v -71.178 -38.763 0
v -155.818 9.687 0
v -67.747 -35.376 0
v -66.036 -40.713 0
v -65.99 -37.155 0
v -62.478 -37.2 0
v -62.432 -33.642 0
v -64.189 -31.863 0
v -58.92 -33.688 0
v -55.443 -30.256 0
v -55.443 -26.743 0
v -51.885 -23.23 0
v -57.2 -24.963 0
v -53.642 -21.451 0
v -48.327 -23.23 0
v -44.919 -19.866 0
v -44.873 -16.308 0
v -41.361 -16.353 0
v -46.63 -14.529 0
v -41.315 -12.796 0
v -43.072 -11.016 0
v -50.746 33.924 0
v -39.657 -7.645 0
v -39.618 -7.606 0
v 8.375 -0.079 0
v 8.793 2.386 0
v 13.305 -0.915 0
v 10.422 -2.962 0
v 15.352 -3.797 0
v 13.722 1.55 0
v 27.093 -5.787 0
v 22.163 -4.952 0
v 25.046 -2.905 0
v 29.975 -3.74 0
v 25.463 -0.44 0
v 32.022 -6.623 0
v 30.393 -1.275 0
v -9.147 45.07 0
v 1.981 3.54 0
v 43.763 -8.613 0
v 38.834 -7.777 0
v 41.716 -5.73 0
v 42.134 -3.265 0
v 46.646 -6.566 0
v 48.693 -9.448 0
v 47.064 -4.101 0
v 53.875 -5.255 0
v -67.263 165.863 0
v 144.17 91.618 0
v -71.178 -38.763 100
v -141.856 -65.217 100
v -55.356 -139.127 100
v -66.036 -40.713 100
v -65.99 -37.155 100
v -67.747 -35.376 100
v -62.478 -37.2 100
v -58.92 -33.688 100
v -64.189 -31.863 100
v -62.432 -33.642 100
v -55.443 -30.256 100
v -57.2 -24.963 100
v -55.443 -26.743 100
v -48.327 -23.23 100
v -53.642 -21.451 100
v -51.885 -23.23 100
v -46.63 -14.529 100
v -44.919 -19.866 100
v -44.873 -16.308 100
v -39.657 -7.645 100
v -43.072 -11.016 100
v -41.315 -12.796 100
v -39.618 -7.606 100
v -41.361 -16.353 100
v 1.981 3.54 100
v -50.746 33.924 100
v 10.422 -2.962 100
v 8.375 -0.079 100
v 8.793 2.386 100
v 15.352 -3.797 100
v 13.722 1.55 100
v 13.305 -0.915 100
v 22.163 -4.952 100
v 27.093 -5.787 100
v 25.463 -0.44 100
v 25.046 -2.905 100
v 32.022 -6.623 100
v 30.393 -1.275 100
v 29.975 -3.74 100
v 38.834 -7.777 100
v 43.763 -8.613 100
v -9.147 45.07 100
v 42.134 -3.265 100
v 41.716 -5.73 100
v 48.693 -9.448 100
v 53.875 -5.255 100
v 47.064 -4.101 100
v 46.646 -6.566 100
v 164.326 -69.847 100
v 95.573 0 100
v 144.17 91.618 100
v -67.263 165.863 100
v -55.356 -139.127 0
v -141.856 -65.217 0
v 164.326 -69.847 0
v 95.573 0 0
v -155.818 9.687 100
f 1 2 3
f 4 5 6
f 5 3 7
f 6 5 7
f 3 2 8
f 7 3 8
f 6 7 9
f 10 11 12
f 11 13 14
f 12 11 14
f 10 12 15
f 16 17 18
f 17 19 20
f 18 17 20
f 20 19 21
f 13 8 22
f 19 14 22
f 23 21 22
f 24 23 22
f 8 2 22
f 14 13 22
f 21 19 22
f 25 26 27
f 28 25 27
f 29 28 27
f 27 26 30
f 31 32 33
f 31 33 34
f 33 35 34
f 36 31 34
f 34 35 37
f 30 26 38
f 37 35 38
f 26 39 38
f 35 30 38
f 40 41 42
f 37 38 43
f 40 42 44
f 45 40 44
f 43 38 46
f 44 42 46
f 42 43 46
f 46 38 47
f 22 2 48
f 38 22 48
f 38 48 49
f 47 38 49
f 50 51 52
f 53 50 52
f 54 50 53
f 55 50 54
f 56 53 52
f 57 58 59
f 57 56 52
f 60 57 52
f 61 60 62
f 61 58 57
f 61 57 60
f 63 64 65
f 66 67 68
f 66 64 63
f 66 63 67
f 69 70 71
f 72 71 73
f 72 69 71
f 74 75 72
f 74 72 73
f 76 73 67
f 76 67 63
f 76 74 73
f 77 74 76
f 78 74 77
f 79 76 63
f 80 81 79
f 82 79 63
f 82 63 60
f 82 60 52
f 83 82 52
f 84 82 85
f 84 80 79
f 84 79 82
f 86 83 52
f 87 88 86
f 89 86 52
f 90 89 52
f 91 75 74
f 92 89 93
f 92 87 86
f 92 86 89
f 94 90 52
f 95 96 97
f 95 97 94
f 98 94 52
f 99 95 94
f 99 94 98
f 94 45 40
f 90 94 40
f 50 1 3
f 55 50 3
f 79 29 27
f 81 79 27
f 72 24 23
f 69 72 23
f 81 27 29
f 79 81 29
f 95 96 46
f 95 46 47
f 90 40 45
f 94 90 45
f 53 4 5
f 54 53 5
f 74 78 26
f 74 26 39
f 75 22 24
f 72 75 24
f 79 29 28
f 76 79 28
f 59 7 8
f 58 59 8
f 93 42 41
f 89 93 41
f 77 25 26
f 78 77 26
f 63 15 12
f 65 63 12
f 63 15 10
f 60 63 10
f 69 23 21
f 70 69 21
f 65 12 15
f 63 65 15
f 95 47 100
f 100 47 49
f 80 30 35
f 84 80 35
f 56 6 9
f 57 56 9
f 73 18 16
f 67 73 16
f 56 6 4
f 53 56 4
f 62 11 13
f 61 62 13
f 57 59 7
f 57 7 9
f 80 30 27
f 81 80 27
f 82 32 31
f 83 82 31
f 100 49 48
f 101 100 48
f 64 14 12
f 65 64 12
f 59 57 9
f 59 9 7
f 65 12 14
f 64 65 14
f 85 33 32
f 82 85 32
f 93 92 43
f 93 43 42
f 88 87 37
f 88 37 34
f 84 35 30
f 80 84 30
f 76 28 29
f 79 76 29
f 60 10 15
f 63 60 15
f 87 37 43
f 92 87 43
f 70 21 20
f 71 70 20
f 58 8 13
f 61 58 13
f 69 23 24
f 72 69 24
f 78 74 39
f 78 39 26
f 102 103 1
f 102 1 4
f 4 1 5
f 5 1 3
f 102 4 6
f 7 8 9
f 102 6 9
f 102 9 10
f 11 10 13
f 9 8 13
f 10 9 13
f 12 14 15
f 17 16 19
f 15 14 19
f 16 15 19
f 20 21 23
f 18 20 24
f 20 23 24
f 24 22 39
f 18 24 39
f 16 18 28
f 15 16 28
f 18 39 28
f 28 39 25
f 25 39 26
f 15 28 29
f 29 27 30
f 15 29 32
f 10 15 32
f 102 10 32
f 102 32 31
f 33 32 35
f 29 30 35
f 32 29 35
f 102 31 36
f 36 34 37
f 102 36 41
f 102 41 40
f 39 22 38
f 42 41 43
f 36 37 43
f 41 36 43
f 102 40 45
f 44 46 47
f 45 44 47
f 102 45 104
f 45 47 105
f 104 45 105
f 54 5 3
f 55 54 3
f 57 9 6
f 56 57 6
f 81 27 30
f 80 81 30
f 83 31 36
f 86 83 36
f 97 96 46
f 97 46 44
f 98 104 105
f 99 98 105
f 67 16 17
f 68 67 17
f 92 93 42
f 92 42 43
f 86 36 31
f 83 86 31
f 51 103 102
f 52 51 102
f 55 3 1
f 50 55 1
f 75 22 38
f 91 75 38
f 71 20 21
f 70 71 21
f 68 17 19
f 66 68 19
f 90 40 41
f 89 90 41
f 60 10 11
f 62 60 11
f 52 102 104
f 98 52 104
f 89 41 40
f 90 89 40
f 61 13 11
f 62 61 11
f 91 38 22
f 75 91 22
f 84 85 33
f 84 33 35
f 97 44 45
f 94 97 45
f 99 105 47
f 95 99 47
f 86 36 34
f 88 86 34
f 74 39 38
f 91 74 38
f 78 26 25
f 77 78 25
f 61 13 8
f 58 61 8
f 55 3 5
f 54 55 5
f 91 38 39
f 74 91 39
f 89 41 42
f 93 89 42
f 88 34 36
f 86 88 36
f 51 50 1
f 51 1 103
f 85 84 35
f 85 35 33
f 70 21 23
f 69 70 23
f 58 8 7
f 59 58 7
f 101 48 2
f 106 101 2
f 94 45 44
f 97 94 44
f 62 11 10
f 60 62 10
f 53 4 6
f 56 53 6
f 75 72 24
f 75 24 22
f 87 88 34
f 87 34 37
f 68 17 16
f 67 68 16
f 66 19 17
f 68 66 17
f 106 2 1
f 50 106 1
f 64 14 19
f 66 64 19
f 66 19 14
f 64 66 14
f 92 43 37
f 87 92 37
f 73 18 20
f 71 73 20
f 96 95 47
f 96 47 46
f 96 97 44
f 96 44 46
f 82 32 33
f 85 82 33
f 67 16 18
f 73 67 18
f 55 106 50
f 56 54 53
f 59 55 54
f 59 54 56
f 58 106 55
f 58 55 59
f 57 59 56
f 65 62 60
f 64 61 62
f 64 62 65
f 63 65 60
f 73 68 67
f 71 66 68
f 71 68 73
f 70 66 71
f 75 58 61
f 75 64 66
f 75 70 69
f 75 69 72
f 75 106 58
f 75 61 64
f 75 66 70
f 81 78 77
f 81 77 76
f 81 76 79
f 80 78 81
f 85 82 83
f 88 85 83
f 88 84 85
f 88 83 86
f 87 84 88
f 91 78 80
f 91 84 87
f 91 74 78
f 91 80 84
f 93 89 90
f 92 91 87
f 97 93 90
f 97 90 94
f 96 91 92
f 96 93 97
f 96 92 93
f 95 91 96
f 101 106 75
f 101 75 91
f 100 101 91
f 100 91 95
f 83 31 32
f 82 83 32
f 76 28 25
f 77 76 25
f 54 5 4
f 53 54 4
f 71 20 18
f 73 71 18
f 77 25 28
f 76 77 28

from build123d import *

# Parameters (mm, degrees)
F1_DEPTH = 100
F2_DEPTH = 100


with BuildPart() as f1:
    # F0 (on Top) → F1 (new body)
    with BuildSketch(Plane.XY):
        Polygon((47.063552, -4.100652), (53.87475, -5.25502), (54.52035, -3.4165), (55.49985, -0.94579), (57.70885, 4.3215), (58.83355, 7.1273), (59.89635, 10.0413), (60.84015, 13.0489), (61.60975, 16.1281), (62.15425, 19.2503), (62.42905, 22.3813), (62.39715, 25.483), (62.03065, 28.5147), (61.64635, 30.0767), (56.95075, 31.9738), (54.45145, 32.505), (54.47725, 32.6261), (53.28815, 33.6967), (53.62085, 35.2618), (55.14255, 35.7562), (55.32655, 35.5905), (57.88995, 35.0457), (60.28315, 34.0787), (60.23445, 34.2037), (58.80165, 36.7834), (57.02775, 39.1417), (54.93675, 41.2523), (52.56115, 43.0965), (49.94065, 44.6643), (47.12005, 45.9551), (44.14795, 46.9776), (41.07425, 47.75), (37.94825, 48.2994), (34.81675, 48.6605), (31.72235, 48.8748), (28.70165, 48.9886), (22.99125, 49.1129), (20.33575, 49.2231), (17.82175, 49.4276), (15.44465, 49.7675), (13.19215, 50.2766), (11.04515, 50.9802), (8.97875, 51.894), (6.96425, 53.0228), (4.97025, 54.3608), (2.96505, 55.8911), (0.91795, 57.5861), (-3.4089, 61.3147), (-5.72986, 63.2514), (-8.17284, 65.1627), (-10.74162, 66.9897), (-13.40326, 68.655), (-16.20161, 75.2043), (-14.03963, 79.8407), (-19.57281, 82.4209), (-20.20982, 83.7705), (-24.42685, 91.3774), (-29.06795, 98.0634), (-31.05355, 100.1334), (-37.50015, 98.4054), (-37.48715, 98.3574), (-43.86225, 96.6494), (-43.87525, 96.6974), (-50.32175, 94.9704), (-51.00685, 92.1854), (-51.68285, 84.0741), (-51.53145, 75.3779), (-51.40835, 73.8905), (-54.91005, 68.8895), (-50.40475, 65.7348), (-48.90245, 67.8802), (-42.34855, 43.4208), (-51.04195, 41.0914), (-53.64105, 50.7915), (-53.81195, 50.3678), (-54.85355, 47.5301), (-56.73645, 42.1377), (-57.66175, 39.6462), (-58.63325, 37.3183), (-59.69105, 35.1626), (-60.87125, 33.1777), (-62.20395, 31.3532), (-63.71145, 29.6703), (-65.40765, 28.1032), (-67.29635, 26.6203), (-69.37125, 25.1861), (-71.61595, 23.763), (-76.49915, 20.8001), (-79.05825, 19.1913), (-81.63085, 17.4585), (-84.16225, 15.58), (-86.59475, 13.5412), (-88.87045, 11.3354), (-90.93315, 8.9639), (-92.73045, 6.4358), (-94.21595, 3.7677), (-94.82315, 2.2781), (-92.13945, -2.01668), (-90.42975, -3.9155), (-90.52175, -3.99832), (-90.18905, -5.56336), (-91.37805, -6.63397), (-92.89975, -6.13954), (-92.95125, -5.89739), (-94.70485, -3.94984), (-96.07265, -1.7609), (-96.10675, -1.89056), (-96.46385, -4.81984), (-96.41485, -7.7704), (-95.96375, -10.70692), (-95.12595, -13.59526), (-93.92745, -16.40399), (-92.40425, -19.10613), (-90.60075, -21.6803), (-88.56805, -24.1119), (-86.36195, -26.3938), (-84.04085, -28.5265), (-81.66345, -30.5187), (-79.28645, -32.3863), (-74.73975, -35.8434), (-72.65615, -37.4933), (-71.17785, -38.7628), (-67.746659, -35.375531), (-65.990316, -37.154648), (-66.036159, -40.712882), (-62.477924, -37.200195), (-58.91969, -33.687508), (-62.432377, -33.642252), (-64.18872, -31.863135), (-57.199591, -24.963471), (-55.443247, -26.742588), (-55.443247, -30.255566), (-51.885013, -26.742879), (-48.326779, -23.230192), (-51.885308, -23.230192), (-53.641652, -21.451075), (-46.629601, -14.528783), (-44.873258, -16.3079), (-44.9191, -19.866134), (-41.360866, -16.353447), (-41.315319, -12.795504), (-43.071662, -11.016387), (-39.656596, -7.645036), (-39.61755, -7.60649), (-50.74555, 33.9239), (-9.14656, 45.0703), (1.98145, 3.5399), (8.792648, 2.385532), (8.374903, -0.079318), (10.422009, -2.961914), (15.35171, -3.797404), (13.304605, -0.914808), (13.72235, 1.550042), (25.463249, -0.439815), (25.045504, -2.904666), (22.162909, -4.951772), (27.09261, -5.787261), (32.022312, -6.622751), (29.975206, -3.740156), (30.392951, -1.275305), (42.13385, -3.265162), (41.716105, -5.730013), (38.83351, -7.777119), (43.763211, -8.612609), (48.692913, -9.448099), (46.645807, -6.565503), align=None)
        Polygon((-71.09905, -29.6513), (-71.20325, -29.5837), (-73.46545, -29.4651), (-78.15285, -28.7227), (-82.73695, -27.4944), (-84.95225, -26.644), (-83.80545, -23.6566), (-81.74675, -24.4468), (-77.48665, -25.5883), (-73.13045, -26.2783), (-70.92835, -26.3937), (-70.93155, -26.4557), (-69.58965, -27.3272), (-69.67345, -28.925), align=None, mode=Mode.SUBTRACT)
        Polygon((-70.74295, -22.8573), (-74.18435, -22.3123), (-77.43725, -21.0636), (-80.35935, -19.16594), (-82.82315, -16.70218), (-84.72085, -13.78001), (-85.96945, -10.52715), (-86.51455, -7.08579), (-86.33215, -3.60628), (-85.43035, -0.24072), (-83.84855, 2.8638), (-81.65585, 5.5716), (-78.94805, 7.7643), (-75.84355, 9.3462), (-72.47795, 10.248), (-68.99845, 10.4303), (-65.55705, 9.8853), (-62.30415, 8.6366), (-59.38205, 6.7389), (-56.91825, 4.2752), (-55.02055, 1.353), (-53.77195, -1.89987), (-53.22685, -5.34126), (-53.40925, -8.820756), (-54.31105, -12.1863), (-55.89285, -15.29082), (-58.08555, -17.99861), (-60.79335, -20.1914), (-63.89795, -21.7732), (-67.26345, -22.675), align=None, mode=Mode.SUBTRACT)
        Polygon((47.65305, 2.5126), (46.78155, 3.8544), (47.50795, 5.28), (49.10575, 5.3638), (49.97715, 4.0219), (49.25085, 2.5963), align=None, mode=Mode.SUBTRACT)
        Polygon((-68.80985, 14.0287), (-70.15175, 14.9001), (-70.06795, 16.4979), (-68.64235, 17.2243), (-67.30055, 16.3529), (-67.38425, 14.7551), align=None, mode=Mode.SUBTRACT)
        Polygon((-38.42705, 76.3648), (-41.06855, 86.2228), (-40.95165, 86.2541), (-40.99295, 86.4082), (-40.82145, 86.6005), (-40.83585, 86.6542), (-40.60045, 86.9603), (-40.34885, 87.0277), (-40.37745, 87.1348), (-40.04765, 87.5049), (-39.58545, 87.769), (-39.29825, 86.6972), (-36.45885, 87.458), (-36.74675, 88.5325), (-36.73955, 88.5344), (-36.57845, 88.5497), (-35.93765, 88.4719), (-35.69425, 88.2749), (-35.46745, 88.3356), (-35.06415, 88.1691), (-35.05765, 88.145), (-34.76845, 87.9109), (-34.69345, 87.931), (-32.05195, 78.073), align=None, mode=Mode.SUBTRACT)
        Polygon((35.59585, 5.6361), (32.15445, 6.1811), (28.90165, 7.4298), (25.97945, 9.3275), (23.51575, 11.7912), (21.61805, 14.7134), (20.36935, 17.9662), (19.82435, 21.4076), (20.00665, 24.8871), (20.90845, 28.2527), (22.49025, 31.3572), (24.68305, 34.065), (27.39085, 36.2577), (30.49535, 37.8396), (33.86085, 38.7414), (37.34045, 38.9237), (40.78175, 38.3787), (44.03465, 37.13), (46.95685, 35.2323), (49.42055, 32.7686), (51.31825, 29.8464), (52.56695, 26.5935), (53.11195, 23.1522), (52.92965, 19.6727), (52.02785, 16.3071), (50.44595, 13.2026), (48.25325, 10.4948), (45.54545, 8.3021), (42.44095, 6.7202), (39.07535, 5.8184), align=None, mode=Mode.SUBTRACT)
        Polygon((23.83045, 39.196), (22.95905, 40.5379), (23.68545, 41.9635), (23.80955, 41.97), (25.70935, 43.2038), (29.93795, 45.3583), (34.36855, 47.0591), (36.66065, 47.6732), (37.48885, 44.5823), (35.35875, 44.0115), (31.24125, 42.431), (27.31155, 40.4287), (25.46215, 39.2276), (25.42835, 39.2798), align=None, mode=Mode.SUBTRACT)
        Polygon((-40.95165, 86.2541), (-41.06855, 86.2228), (-38.42705, 76.3648), (-32.05195, 78.073), (-34.69345, 87.931), (-34.76845, 87.9109), (-35.05765, 88.145), (-35.06415, 88.1691), (-35.46745, 88.3356), (-35.69425, 88.2749), (-35.93765, 88.4719), (-36.57845, 88.5497), (-36.73955, 88.5344), (-36.74675, 88.5325), (-36.45885, 87.458), (-39.29825, 86.6972), (-39.58545, 87.769), (-40.04765, 87.5049), (-40.37745, 87.1348), (-40.34885, 87.0277), (-40.60045, 86.9603), (-40.83585, 86.6542), (-40.82145, 86.6005), (-40.99295, 86.4082), align=None)
        Polygon((28.90165, 7.4298), (32.15445, 6.1811), (35.59585, 5.6361), (39.07535, 5.8184), (42.44095, 6.7202), (45.54545, 8.3021), (48.25325, 10.4948), (50.44595, 13.2026), (52.02785, 16.3071), (52.92965, 19.6727), (53.11195, 23.1522), (52.56695, 26.5935), (51.31825, 29.8464), (49.42055, 32.7686), (46.95685, 35.2323), (44.03465, 37.13), (40.78175, 38.3787), (37.34045, 38.9237), (33.86085, 38.7414), (30.49535, 37.8396), (27.39085, 36.2577), (24.68305, 34.065), (22.49025, 31.3572), (20.90845, 28.2527), (20.00665, 24.8871), (19.82435, 21.4076), (20.36935, 17.9662), (21.61805, 14.7134), (23.51575, 11.7912), (25.97945, 9.3275), align=None)
        Polygon((-77.43725, -21.0636), (-74.18435, -22.3123), (-70.74295, -22.8573), (-67.26345, -22.675), (-63.89795, -21.7732), (-60.79335, -20.1914), (-58.08555, -17.99861), (-55.89285, -15.29082), (-54.31105, -12.1863), (-53.40925, -8.820756), (-53.22685, -5.34126), (-53.77195, -1.89987), (-55.02055, 1.353), (-56.91825, 4.2752), (-59.38205, 6.7389), (-62.30415, 8.6366), (-65.55705, 9.8853), (-68.99845, 10.4303), (-72.47795, 10.248), (-75.84355, 9.3462), (-78.94805, 7.7643), (-81.65585, 5.5716), (-83.84855, 2.8638), (-85.43035, -0.24072), (-86.33215, -3.60628), (-86.51455, -7.08579), (-85.96945, -10.52715), (-84.72085, -13.78001), (-82.82315, -16.70218), (-80.35935, -19.16594), align=None)
        Polygon((-70.06795, 16.4979), (-70.15175, 14.9001), (-68.80985, 14.0287), (-67.38425, 14.7551), (-67.30055, 16.3529), (-68.64235, 17.2243), align=None)
        Polygon((47.50795, 5.28), (46.78155, 3.8544), (47.65305, 2.5126), (49.25085, 2.5963), (49.97715, 4.0219), (49.10575, 5.3638), align=None)
        Polygon((23.68545, 41.9635), (22.95905, 40.5379), (23.83045, 39.196), (25.42835, 39.2798), (25.46215, 39.2276), (27.31155, 40.4287), (31.24125, 42.431), (35.35875, 44.0115), (37.48885, 44.5823), (36.66065, 47.6732), (34.36855, 47.0591), (29.93795, 45.3583), (25.70935, 43.2038), (23.80955, 41.97), align=None)
        Polygon((-73.46545, -29.4651), (-71.20325, -29.5837), (-71.09905, -29.6513), (-69.67345, -28.925), (-69.58965, -27.3272), (-70.93155, -26.4557), (-70.92835, -26.3937), (-73.13045, -26.2783), (-77.48665, -25.5883), (-81.74675, -24.4468), (-83.80545, -23.6566), (-84.95225, -26.644), (-82.73695, -27.4944), (-78.15285, -28.7227), align=None)
        Polygon((54.52035, -3.4165), (53.87475, -5.25502), (144.169867, 91.61818), (-67.26345, 165.863415), (-155.817702, 9.686623), (-71.17785, -38.7628), (-72.65615, -37.4933), (-74.73975, -35.8434), (-79.28645, -32.3863), (-81.66345, -30.5187), (-84.04085, -28.5265), (-86.36195, -26.3938), (-88.56805, -24.1119), (-90.60075, -21.6803), (-92.40425, -19.10613), (-93.92745, -16.40399), (-95.12595, -13.59526), (-95.96375, -10.70692), (-96.41485, -7.7704), (-96.46385, -4.81984), (-96.10675, -1.89056), (-96.07265, -1.7609), (-94.70485, -3.94984), (-92.95125, -5.89739), (-92.89975, -6.13954), (-91.37805, -6.63397), (-90.18905, -5.56336), (-90.52175, -3.99832), (-90.42975, -3.9155), (-92.13945, -2.01668), (-94.82315, 2.2781), (-94.21595, 3.7677), (-92.73045, 6.4358), (-90.93315, 8.9639), (-88.87045, 11.3354), (-86.59475, 13.5412), (-84.16225, 15.58), (-81.63085, 17.4585), (-79.05825, 19.1913), (-76.49915, 20.8001), (-71.61595, 23.763), (-69.37125, 25.1861), (-67.29635, 26.6203), (-65.40765, 28.1032), (-63.71145, 29.6703), (-62.20395, 31.3532), (-60.87125, 33.1777), (-59.69105, 35.1626), (-58.63325, 37.3183), (-57.66175, 39.6462), (-56.73645, 42.1377), (-54.85355, 47.5301), (-53.81195, 50.3678), (-53.64105, 50.7915), (-51.04195, 41.0914), (-42.34855, 43.4208), (-48.90245, 67.8802), (-50.40475, 65.7348), (-54.91005, 68.8895), (-51.40835, 73.8905), (-51.53145, 75.3779), (-51.68285, 84.0741), (-51.00685, 92.1854), (-50.32175, 94.9704), (-43.87525, 96.6974), (-43.86225, 96.6494), (-37.48715, 98.3574), (-37.50015, 98.4054), (-31.05355, 100.1334), (-29.06795, 98.0634), (-24.42685, 91.3774), (-20.20982, 83.7705), (-19.57281, 82.4209), (-14.03963, 79.8407), (-16.20161, 75.2043), (-13.40326, 68.655), (-10.74162, 66.9897), (-8.17284, 65.1627), (-5.72986, 63.2514), (-3.4089, 61.3147), (0.91795, 57.5861), (2.96505, 55.8911), (4.97025, 54.3608), (6.96425, 53.0228), (8.97875, 51.894), (11.04515, 50.9802), (13.19215, 50.2766), (15.44465, 49.7675), (17.82175, 49.4276), (20.33575, 49.2231), (22.99125, 49.1129), (28.70165, 48.9886), (31.72235, 48.8748), (34.81675, 48.6605), (37.94825, 48.2994), (41.07425, 47.75), (44.14795, 46.9776), (47.12005, 45.9551), (49.94065, 44.6643), (52.56115, 43.0965), (54.93675, 41.2523), (57.02775, 39.1417), (58.80165, 36.7834), (60.23445, 34.2037), (60.28315, 34.0787), (57.88995, 35.0457), (55.32655, 35.5905), (55.14255, 35.7562), (53.62085, 35.2618), (53.28815, 33.6967), (54.47725, 32.6261), (54.45145, 32.505), (56.95075, 31.9738), (61.64635, 30.0767), (62.03065, 28.5147), (62.39715, 25.483), (62.42905, 22.3813), (62.15425, 19.2503), (61.60975, 16.1281), (60.84015, 13.0489), (59.89635, 10.0413), (58.83355, 7.1273), (57.70885, 4.3215), (55.49985, -0.94579), align=None)
    extrude(amount=F1_DEPTH)


with BuildPart() as f2:
    # F0 (on Top) → F2 (new body)
    with BuildSketch(Plane.XY):
        Polygon((11.90965, -100.1334), (13.22625, -95.2199), (4.45365, -92.8693), (14.84455, -54.0901), (52.07465, -64.0659), (52.62445, -63.4753), (64.97425, -66.7844), (69.57335, -49.6203), (71.06085, -48.5787), (72.54825, -48.7018), (81.24445, -48.8532), (89.35575, -48.1771), (92.14075, -47.4921), (93.86775, -41.0456), (93.81975, -41.0326), (95.52775, -34.6575), (95.57575, -34.6705), (97.30375, -28.2239), (95.23375, -26.2383), (88.54775, -21.5972), (80.94085, -17.38019), (79.59125, -16.74316), (77.01105, -11.20998), (72.37465, -13.37196), (65.89685, -10.60355), (59.65165, -7.99066), (54.72455, -5.74194), (53.87475, -5.25502), (47.063552, -4.100652), (46.645807, -6.565503), (48.692913, -9.448099), (43.763211, -8.612609), (38.83351, -7.777119), (41.716105, -5.730013), (42.13385, -3.265162), (30.392951, -1.275305), (29.975206, -3.740156), (32.022312, -6.622751), (27.09261, -5.787261), (22.162909, -4.951772), (25.045504, -2.904666), (25.463249, -0.439815), (13.72235, 1.550042), (13.304605, -0.914808), (15.35171, -3.797404), (10.422009, -2.961914), (8.374903, -0.079318), (8.792648, 2.385532), (1.98145, 3.5399), (-9.14656, 45.0703), (-50.74555, 33.9239), (-39.61755, -7.60649), (-39.656596, -7.645036), (-43.071662, -11.016387), (-41.315319, -12.795504), (-41.360866, -16.353447), (-44.9191, -19.866134), (-44.873258, -16.3079), (-46.629601, -14.528783), (-53.641652, -21.451075), (-51.885308, -23.230192), (-48.326779, -23.230192), (-51.885013, -26.742879), (-55.443247, -30.255566), (-55.443247, -26.742588), (-57.199591, -24.963471), (-64.18872, -31.863135), (-62.432377, -33.642252), (-58.91969, -33.687508), (-62.477924, -37.200195), (-66.036159, -40.712882), (-65.990316, -37.154648), (-67.746659, -35.375531), (-71.17785, -38.7628), (-71.67025, -39.6093), (-74.81295, -44.0203), (-78.91505, -49.4058), (-83.14065, -55.0422), (-88.23695, -55.488), (-87.70485, -61.57), (-88.55515, -62.7965), (-93.03435, -70.2519), (-96.50455, -77.6145), (-97.30375, -80.3687), (-92.58445, -85.0879), (-92.54915, -85.0526), (-87.88225, -89.7195), (-87.91755, -89.7548), (-83.19835, -94.4741), (-80.44415, -93.6749), (-73.08155, -90.2047), (-65.62615, -85.7255), (-64.39965, -84.8752), (-58.31765, -85.4073), (-57.87185, -80.311), (-54.33325, -77.6581), (-53.75695, -78.6177), (-51.90805, -81.1082), (-49.82955, -83.3455), (-48.60055, -84.3832), (-43.68665, -83.1581), (-41.35245, -82.1188), (-41.30205, -82.2319), (-39.71085, -82.3991), (-39.06005, -83.8608), (-40.00055, -85.1552), (-40.24675, -85.1294), (-42.64085, -86.1953), (-45.14535, -86.8197), (-45.03255, -86.8922), (-42.35695, -88.137), (-39.53565, -89.0023), (-36.60345, -89.4807), (-33.59765, -89.5764), (-30.55595, -89.3045), (-27.51545, -88.6909), (-24.50995, -87.7711), (-21.56923, -86.5893), (-18.71733, -85.1963), (-15.97166, -83.6479), (-13.34227, -82.0024), (-10.8316, -80.319), (-6.13873, -77.063), (-3.92564, -75.5913), (-1.88705, -74.3495), (-7.40884, -94.957), align=None)
        Polygon((-80.44795, -82.114), (-80.70025, -82.0617), (-80.73955, -82.101), (-81.12235, -82.0502), (-81.30655, -81.866), (-81.38495, -81.9444), (-81.87035, -81.8438), (-82.33015, -81.5755), (-81.54555, -80.7909), (-83.62415, -78.7123), (-84.41065, -79.4989), (-84.41605, -79.4935), (-84.50975, -79.3617), (-84.76285, -78.7679), (-84.71395, -78.4586), (-84.87975, -78.2927), (-84.93725, -77.8599), (-84.91965, -77.8423), (-84.86155, -77.4748), (-84.91645, -77.4199), (-77.69985, -70.2033), (-73.03295, -74.8702), (-80.24955, -82.0868), (-80.33515, -82.0013), align=None, mode=Mode.SUBTRACT)
        Polygon((-33.68605, -79.92), (-37.12745, -79.3749), (-40.38025, -78.1263), (-43.30245, -76.2286), (-45.76625, -73.7648), (-47.66385, -70.8427), (-48.91255, -67.5898), (-49.45765, -64.1484), (-49.27525, -60.6689), (-48.37345, -57.3034), (-46.79165, -54.1988), (-44.59895, -51.491), (-41.89115, -49.2983), (-38.78655, -47.7165), (-35.42105, -46.8147), (-31.94155, -46.6323), (-28.50015, -47.1774), (-25.24725, -48.4261), (-22.32515, -50.3237), (-19.86136, -52.7875), (-17.96367, -55.7097), (-16.71503, -58.9625), (-16.16995, -62.4039), (-16.35231, -65.8834), (-17.25412, -69.249), (-18.83594, -72.3535), (-21.02867, -75.0613), (-23.73645, -77.254), (-26.84095, -78.8358), (-30.20655, -79.7376), align=None, mode=Mode.SUBTRACT)
        Polygon((-18.04369, -83.9329), (-20.53055, -81.9191), (-19.14276, -80.2053), (-16.74068, -76.5065), (-14.73839, -72.5767), (-13.94812, -70.518), (-13.89011, -70.5403), (-12.646667, -69.5334), (-11.152954, -70.1068), (-10.90266, -71.6871), (-10.99925, -71.7653), (-11.81105, -73.8801), (-13.96559, -78.1087), (-16.55037, -82.0888), align=None, mode=Mode.SUBTRACT)
        Polygon((-52.98085, -57.019), (-54.47465, -56.4456), (-54.72495, -54.8653), (-53.48145, -53.8584), (-51.98775, -54.4317), (-51.73745, -56.012), align=None, mode=Mode.SUBTRACT)
        Polygon((-29.46675, -39.4282), (-37.23135, -10.45041), (-28.53805, -8.12105), (-20.77344, -37.0988), align=None, mode=Mode.SUBTRACT)
        Polygon((0.40815, -31.4232), (-7.35638, -2.44544), (1.33695, -0.11607), (9.10155, -29.0938), align=None, mode=Mode.SUBTRACT)
        Polygon((-11.476974, -11.46422), (-13.22224, -11.23445), (-14.29387, -9.837876), (-14.0641, -8.09261), (-12.667526, -7.02098), (-10.92226, -7.25075), (-9.85063, -8.647324), (-10.0804, -10.39259), align=None, mode=Mode.SUBTRACT)
        Polygon((62.18005, -45.7029), (59.62655, -53.3009), (25.72255, -44.2163), (24.94615, -47.1141), (16.25275, -44.7847), (25.05265, -11.94324), (63.68965, -22.296), (62.66675, -42.7274), align=None, mode=Mode.SUBTRACT)
        Polygon((83.39315, -38.2389), (73.53515, -35.5974), (75.24335, -29.2223), (85.10135, -31.8638), (85.07005, -31.9807), (85.22405, -32.022), (85.30495, -32.2666), (85.35865, -32.281), (85.50595, -32.6378), (85.43855, -32.8895), (85.54565, -32.9182), (85.70125, -33.3889), (85.69895, -33.9213), (84.62705, -33.6341), (83.86615, -36.4735), (84.94065, -36.7614), (84.93865, -36.7689), (84.87145, -36.9158), (84.48365, -37.4318), (84.19135, -37.5441), (84.13065, -37.7708), (83.78465, -38.0369), (83.76055, -38.0304), (83.41325, -38.1639), align=None, mode=Mode.SUBTRACT)
        Polygon((-40.38025, -78.1263), (-37.12745, -79.3749), (-33.68605, -79.92), (-30.20655, -79.7376), (-26.84095, -78.8358), (-23.73645, -77.254), (-21.02867, -75.0613), (-18.83594, -72.3535), (-17.25412, -69.249), (-16.35231, -65.8834), (-16.16995, -62.4039), (-16.71503, -58.9625), (-17.96367, -55.7097), (-19.86136, -52.7875), (-22.32515, -50.3237), (-25.24725, -48.4261), (-28.50015, -47.1774), (-31.94155, -46.6323), (-35.42105, -46.8147), (-38.78655, -47.7165), (-41.89115, -49.2983), (-44.59895, -51.491), (-46.79165, -54.1988), (-48.37345, -57.3034), (-49.27525, -60.6689), (-49.45765, -64.1484), (-48.91255, -67.5898), (-47.66385, -70.8427), (-45.76625, -73.7648), (-43.30245, -76.2286), align=None)
        Polygon((-28.53805, -8.12105), (-37.23135, -10.45041), (-29.46675, -39.4282), (-20.77344, -37.0988), align=None)
        Polygon((1.33695, -0.11607), (-7.35638, -2.44544), (0.40815, -31.4232), (9.10155, -29.0938), align=None)
        Polygon((25.72255, -44.2163), (59.62655, -53.3009), (62.18005, -45.7029), (62.66675, -42.7274), (63.68965, -22.296), (25.05265, -11.94324), (16.25275, -44.7847), (24.94615, -47.1141), align=None)
        Polygon((-80.73955, -82.101), (-80.70025, -82.0617), (-80.44795, -82.114), (-80.33515, -82.0013), (-80.24955, -82.0868), (-73.03295, -74.8702), (-77.69985, -70.2033), (-84.91645, -77.4199), (-84.86155, -77.4748), (-84.91965, -77.8423), (-84.93725, -77.8599), (-84.87975, -78.2927), (-84.71395, -78.4586), (-84.76285, -78.7679), (-84.50975, -79.3617), (-84.41605, -79.4935), (-84.41065, -79.4989), (-83.62415, -78.7123), (-81.54555, -80.7909), (-82.33015, -81.5755), (-81.87035, -81.8438), (-81.38495, -81.9444), (-81.30655, -81.866), (-81.12235, -82.0502), align=None)
        Polygon((75.24335, -29.2223), (73.53515, -35.5974), (83.39315, -38.2389), (83.41325, -38.1639), (83.76055, -38.0304), (83.78465, -38.0369), (84.13065, -37.7708), (84.19135, -37.5441), (84.48365, -37.4318), (84.87145, -36.9158), (84.93865, -36.7689), (84.94065, -36.7614), (83.86615, -36.4735), (84.62705, -33.6341), (85.69895, -33.9213), (85.70125, -33.3889), (85.54565, -32.9182), (85.43855, -32.8895), (85.50595, -32.6378), (85.35865, -32.281), (85.30495, -32.2666), (85.22405, -32.022), (85.07005, -31.9807), (85.10135, -31.8638), align=None)
        Polygon((-19.14276, -80.2053), (-20.53055, -81.9191), (-18.04369, -83.9329), (-16.55037, -82.0888), (-13.96559, -78.1087), (-11.81105, -73.8801), (-10.99925, -71.7653), (-10.90266, -71.6871), (-11.152954, -70.1068), (-12.646667, -69.5334), (-13.89011, -70.5403), (-13.94812, -70.518), (-14.73839, -72.5767), (-16.74068, -76.5065), align=None)
        Polygon((-14.29387, -9.837876), (-13.22224, -11.23445), (-11.476974, -11.46422), (-10.0804, -10.39259), (-9.85063, -8.647324), (-10.92226, -7.25075), (-12.667526, -7.02098), (-14.0641, -8.09261), align=None)
        Polygon((-54.72495, -54.8653), (-54.47465, -56.4456), (-52.98085, -57.019), (-51.73745, -56.012), (-51.98775, -54.4317), (-53.48145, -53.8584), align=None)
        Polygon((4.45365, -92.8693), (13.22625, -95.2199), (11.90965, -100.1334), (-7.40884, -94.957), (-1.88705, -74.3495), (-3.92564, -75.5913), (-6.13873, -77.063), (-10.8316, -80.319), (-13.34227, -82.0024), (-15.97166, -83.6479), (-18.71733, -85.1963), (-21.56923, -86.5893), (-24.50995, -87.7711), (-27.51545, -88.6909), (-30.55595, -89.3045), (-33.59765, -89.5764), (-36.60345, -89.4807), (-39.53565, -89.0023), (-42.35695, -88.137), (-45.03255, -86.8922), (-45.14535, -86.8197), (-42.64085, -86.1953), (-40.24675, -85.1294), (-40.00055, -85.1552), (-39.06005, -83.8608), (-39.71085, -82.3991), (-41.30205, -82.2319), (-41.35245, -82.1188), (-43.68665, -83.1581), (-48.60055, -84.3832), (-49.82955, -83.3455), (-51.90805, -81.1082), (-53.75695, -78.6177), (-54.33325, -77.6581), (-57.87185, -80.311), (-58.31765, -85.4073), (-64.39965, -84.8752), (-65.62615, -85.7255), (-73.08155, -90.2047), (-80.44415, -93.6749), (-83.19835, -94.4741), (-87.91755, -89.7548), (-87.88225, -89.7195), (-92.54915, -85.0526), (-92.58445, -85.0879), (-97.30375, -80.3687), (-96.50455, -77.6145), (-93.03435, -70.2519), (-88.55515, -62.7965), (-87.70485, -61.57), (-88.23695, -55.488), (-83.14065, -55.0422), (-78.91505, -49.4058), (-74.81295, -44.0203), (-71.67025, -39.6093), (-71.17785, -38.7628), (-141.855791, -65.216534), (-55.356011, -139.126509), (164.325565, -69.847435), (95.573172, 0), (53.87475, -5.25502), (54.72455, -5.74194), (59.65165, -7.99066), (65.89685, -10.60355), (72.37465, -13.37196), (77.01105, -11.20998), (79.59125, -16.74316), (80.94085, -17.38019), (88.54775, -21.5972), (95.23375, -26.2383), (97.30375, -28.2239), (95.57575, -34.6705), (95.52775, -34.6575), (93.81975, -41.0326), (93.86775, -41.0456), (92.14075, -47.4921), (89.35575, -48.1771), (81.24445, -48.8532), (72.54825, -48.7018), (71.06085, -48.5787), (69.57335, -49.6203), (64.97425, -66.7844), (52.62445, -63.4753), (52.07465, -64.0659), (14.84455, -54.0901), align=None)
    extrude(amount=F2_DEPTH)


solid = Compound([f1.part, f2.part])
